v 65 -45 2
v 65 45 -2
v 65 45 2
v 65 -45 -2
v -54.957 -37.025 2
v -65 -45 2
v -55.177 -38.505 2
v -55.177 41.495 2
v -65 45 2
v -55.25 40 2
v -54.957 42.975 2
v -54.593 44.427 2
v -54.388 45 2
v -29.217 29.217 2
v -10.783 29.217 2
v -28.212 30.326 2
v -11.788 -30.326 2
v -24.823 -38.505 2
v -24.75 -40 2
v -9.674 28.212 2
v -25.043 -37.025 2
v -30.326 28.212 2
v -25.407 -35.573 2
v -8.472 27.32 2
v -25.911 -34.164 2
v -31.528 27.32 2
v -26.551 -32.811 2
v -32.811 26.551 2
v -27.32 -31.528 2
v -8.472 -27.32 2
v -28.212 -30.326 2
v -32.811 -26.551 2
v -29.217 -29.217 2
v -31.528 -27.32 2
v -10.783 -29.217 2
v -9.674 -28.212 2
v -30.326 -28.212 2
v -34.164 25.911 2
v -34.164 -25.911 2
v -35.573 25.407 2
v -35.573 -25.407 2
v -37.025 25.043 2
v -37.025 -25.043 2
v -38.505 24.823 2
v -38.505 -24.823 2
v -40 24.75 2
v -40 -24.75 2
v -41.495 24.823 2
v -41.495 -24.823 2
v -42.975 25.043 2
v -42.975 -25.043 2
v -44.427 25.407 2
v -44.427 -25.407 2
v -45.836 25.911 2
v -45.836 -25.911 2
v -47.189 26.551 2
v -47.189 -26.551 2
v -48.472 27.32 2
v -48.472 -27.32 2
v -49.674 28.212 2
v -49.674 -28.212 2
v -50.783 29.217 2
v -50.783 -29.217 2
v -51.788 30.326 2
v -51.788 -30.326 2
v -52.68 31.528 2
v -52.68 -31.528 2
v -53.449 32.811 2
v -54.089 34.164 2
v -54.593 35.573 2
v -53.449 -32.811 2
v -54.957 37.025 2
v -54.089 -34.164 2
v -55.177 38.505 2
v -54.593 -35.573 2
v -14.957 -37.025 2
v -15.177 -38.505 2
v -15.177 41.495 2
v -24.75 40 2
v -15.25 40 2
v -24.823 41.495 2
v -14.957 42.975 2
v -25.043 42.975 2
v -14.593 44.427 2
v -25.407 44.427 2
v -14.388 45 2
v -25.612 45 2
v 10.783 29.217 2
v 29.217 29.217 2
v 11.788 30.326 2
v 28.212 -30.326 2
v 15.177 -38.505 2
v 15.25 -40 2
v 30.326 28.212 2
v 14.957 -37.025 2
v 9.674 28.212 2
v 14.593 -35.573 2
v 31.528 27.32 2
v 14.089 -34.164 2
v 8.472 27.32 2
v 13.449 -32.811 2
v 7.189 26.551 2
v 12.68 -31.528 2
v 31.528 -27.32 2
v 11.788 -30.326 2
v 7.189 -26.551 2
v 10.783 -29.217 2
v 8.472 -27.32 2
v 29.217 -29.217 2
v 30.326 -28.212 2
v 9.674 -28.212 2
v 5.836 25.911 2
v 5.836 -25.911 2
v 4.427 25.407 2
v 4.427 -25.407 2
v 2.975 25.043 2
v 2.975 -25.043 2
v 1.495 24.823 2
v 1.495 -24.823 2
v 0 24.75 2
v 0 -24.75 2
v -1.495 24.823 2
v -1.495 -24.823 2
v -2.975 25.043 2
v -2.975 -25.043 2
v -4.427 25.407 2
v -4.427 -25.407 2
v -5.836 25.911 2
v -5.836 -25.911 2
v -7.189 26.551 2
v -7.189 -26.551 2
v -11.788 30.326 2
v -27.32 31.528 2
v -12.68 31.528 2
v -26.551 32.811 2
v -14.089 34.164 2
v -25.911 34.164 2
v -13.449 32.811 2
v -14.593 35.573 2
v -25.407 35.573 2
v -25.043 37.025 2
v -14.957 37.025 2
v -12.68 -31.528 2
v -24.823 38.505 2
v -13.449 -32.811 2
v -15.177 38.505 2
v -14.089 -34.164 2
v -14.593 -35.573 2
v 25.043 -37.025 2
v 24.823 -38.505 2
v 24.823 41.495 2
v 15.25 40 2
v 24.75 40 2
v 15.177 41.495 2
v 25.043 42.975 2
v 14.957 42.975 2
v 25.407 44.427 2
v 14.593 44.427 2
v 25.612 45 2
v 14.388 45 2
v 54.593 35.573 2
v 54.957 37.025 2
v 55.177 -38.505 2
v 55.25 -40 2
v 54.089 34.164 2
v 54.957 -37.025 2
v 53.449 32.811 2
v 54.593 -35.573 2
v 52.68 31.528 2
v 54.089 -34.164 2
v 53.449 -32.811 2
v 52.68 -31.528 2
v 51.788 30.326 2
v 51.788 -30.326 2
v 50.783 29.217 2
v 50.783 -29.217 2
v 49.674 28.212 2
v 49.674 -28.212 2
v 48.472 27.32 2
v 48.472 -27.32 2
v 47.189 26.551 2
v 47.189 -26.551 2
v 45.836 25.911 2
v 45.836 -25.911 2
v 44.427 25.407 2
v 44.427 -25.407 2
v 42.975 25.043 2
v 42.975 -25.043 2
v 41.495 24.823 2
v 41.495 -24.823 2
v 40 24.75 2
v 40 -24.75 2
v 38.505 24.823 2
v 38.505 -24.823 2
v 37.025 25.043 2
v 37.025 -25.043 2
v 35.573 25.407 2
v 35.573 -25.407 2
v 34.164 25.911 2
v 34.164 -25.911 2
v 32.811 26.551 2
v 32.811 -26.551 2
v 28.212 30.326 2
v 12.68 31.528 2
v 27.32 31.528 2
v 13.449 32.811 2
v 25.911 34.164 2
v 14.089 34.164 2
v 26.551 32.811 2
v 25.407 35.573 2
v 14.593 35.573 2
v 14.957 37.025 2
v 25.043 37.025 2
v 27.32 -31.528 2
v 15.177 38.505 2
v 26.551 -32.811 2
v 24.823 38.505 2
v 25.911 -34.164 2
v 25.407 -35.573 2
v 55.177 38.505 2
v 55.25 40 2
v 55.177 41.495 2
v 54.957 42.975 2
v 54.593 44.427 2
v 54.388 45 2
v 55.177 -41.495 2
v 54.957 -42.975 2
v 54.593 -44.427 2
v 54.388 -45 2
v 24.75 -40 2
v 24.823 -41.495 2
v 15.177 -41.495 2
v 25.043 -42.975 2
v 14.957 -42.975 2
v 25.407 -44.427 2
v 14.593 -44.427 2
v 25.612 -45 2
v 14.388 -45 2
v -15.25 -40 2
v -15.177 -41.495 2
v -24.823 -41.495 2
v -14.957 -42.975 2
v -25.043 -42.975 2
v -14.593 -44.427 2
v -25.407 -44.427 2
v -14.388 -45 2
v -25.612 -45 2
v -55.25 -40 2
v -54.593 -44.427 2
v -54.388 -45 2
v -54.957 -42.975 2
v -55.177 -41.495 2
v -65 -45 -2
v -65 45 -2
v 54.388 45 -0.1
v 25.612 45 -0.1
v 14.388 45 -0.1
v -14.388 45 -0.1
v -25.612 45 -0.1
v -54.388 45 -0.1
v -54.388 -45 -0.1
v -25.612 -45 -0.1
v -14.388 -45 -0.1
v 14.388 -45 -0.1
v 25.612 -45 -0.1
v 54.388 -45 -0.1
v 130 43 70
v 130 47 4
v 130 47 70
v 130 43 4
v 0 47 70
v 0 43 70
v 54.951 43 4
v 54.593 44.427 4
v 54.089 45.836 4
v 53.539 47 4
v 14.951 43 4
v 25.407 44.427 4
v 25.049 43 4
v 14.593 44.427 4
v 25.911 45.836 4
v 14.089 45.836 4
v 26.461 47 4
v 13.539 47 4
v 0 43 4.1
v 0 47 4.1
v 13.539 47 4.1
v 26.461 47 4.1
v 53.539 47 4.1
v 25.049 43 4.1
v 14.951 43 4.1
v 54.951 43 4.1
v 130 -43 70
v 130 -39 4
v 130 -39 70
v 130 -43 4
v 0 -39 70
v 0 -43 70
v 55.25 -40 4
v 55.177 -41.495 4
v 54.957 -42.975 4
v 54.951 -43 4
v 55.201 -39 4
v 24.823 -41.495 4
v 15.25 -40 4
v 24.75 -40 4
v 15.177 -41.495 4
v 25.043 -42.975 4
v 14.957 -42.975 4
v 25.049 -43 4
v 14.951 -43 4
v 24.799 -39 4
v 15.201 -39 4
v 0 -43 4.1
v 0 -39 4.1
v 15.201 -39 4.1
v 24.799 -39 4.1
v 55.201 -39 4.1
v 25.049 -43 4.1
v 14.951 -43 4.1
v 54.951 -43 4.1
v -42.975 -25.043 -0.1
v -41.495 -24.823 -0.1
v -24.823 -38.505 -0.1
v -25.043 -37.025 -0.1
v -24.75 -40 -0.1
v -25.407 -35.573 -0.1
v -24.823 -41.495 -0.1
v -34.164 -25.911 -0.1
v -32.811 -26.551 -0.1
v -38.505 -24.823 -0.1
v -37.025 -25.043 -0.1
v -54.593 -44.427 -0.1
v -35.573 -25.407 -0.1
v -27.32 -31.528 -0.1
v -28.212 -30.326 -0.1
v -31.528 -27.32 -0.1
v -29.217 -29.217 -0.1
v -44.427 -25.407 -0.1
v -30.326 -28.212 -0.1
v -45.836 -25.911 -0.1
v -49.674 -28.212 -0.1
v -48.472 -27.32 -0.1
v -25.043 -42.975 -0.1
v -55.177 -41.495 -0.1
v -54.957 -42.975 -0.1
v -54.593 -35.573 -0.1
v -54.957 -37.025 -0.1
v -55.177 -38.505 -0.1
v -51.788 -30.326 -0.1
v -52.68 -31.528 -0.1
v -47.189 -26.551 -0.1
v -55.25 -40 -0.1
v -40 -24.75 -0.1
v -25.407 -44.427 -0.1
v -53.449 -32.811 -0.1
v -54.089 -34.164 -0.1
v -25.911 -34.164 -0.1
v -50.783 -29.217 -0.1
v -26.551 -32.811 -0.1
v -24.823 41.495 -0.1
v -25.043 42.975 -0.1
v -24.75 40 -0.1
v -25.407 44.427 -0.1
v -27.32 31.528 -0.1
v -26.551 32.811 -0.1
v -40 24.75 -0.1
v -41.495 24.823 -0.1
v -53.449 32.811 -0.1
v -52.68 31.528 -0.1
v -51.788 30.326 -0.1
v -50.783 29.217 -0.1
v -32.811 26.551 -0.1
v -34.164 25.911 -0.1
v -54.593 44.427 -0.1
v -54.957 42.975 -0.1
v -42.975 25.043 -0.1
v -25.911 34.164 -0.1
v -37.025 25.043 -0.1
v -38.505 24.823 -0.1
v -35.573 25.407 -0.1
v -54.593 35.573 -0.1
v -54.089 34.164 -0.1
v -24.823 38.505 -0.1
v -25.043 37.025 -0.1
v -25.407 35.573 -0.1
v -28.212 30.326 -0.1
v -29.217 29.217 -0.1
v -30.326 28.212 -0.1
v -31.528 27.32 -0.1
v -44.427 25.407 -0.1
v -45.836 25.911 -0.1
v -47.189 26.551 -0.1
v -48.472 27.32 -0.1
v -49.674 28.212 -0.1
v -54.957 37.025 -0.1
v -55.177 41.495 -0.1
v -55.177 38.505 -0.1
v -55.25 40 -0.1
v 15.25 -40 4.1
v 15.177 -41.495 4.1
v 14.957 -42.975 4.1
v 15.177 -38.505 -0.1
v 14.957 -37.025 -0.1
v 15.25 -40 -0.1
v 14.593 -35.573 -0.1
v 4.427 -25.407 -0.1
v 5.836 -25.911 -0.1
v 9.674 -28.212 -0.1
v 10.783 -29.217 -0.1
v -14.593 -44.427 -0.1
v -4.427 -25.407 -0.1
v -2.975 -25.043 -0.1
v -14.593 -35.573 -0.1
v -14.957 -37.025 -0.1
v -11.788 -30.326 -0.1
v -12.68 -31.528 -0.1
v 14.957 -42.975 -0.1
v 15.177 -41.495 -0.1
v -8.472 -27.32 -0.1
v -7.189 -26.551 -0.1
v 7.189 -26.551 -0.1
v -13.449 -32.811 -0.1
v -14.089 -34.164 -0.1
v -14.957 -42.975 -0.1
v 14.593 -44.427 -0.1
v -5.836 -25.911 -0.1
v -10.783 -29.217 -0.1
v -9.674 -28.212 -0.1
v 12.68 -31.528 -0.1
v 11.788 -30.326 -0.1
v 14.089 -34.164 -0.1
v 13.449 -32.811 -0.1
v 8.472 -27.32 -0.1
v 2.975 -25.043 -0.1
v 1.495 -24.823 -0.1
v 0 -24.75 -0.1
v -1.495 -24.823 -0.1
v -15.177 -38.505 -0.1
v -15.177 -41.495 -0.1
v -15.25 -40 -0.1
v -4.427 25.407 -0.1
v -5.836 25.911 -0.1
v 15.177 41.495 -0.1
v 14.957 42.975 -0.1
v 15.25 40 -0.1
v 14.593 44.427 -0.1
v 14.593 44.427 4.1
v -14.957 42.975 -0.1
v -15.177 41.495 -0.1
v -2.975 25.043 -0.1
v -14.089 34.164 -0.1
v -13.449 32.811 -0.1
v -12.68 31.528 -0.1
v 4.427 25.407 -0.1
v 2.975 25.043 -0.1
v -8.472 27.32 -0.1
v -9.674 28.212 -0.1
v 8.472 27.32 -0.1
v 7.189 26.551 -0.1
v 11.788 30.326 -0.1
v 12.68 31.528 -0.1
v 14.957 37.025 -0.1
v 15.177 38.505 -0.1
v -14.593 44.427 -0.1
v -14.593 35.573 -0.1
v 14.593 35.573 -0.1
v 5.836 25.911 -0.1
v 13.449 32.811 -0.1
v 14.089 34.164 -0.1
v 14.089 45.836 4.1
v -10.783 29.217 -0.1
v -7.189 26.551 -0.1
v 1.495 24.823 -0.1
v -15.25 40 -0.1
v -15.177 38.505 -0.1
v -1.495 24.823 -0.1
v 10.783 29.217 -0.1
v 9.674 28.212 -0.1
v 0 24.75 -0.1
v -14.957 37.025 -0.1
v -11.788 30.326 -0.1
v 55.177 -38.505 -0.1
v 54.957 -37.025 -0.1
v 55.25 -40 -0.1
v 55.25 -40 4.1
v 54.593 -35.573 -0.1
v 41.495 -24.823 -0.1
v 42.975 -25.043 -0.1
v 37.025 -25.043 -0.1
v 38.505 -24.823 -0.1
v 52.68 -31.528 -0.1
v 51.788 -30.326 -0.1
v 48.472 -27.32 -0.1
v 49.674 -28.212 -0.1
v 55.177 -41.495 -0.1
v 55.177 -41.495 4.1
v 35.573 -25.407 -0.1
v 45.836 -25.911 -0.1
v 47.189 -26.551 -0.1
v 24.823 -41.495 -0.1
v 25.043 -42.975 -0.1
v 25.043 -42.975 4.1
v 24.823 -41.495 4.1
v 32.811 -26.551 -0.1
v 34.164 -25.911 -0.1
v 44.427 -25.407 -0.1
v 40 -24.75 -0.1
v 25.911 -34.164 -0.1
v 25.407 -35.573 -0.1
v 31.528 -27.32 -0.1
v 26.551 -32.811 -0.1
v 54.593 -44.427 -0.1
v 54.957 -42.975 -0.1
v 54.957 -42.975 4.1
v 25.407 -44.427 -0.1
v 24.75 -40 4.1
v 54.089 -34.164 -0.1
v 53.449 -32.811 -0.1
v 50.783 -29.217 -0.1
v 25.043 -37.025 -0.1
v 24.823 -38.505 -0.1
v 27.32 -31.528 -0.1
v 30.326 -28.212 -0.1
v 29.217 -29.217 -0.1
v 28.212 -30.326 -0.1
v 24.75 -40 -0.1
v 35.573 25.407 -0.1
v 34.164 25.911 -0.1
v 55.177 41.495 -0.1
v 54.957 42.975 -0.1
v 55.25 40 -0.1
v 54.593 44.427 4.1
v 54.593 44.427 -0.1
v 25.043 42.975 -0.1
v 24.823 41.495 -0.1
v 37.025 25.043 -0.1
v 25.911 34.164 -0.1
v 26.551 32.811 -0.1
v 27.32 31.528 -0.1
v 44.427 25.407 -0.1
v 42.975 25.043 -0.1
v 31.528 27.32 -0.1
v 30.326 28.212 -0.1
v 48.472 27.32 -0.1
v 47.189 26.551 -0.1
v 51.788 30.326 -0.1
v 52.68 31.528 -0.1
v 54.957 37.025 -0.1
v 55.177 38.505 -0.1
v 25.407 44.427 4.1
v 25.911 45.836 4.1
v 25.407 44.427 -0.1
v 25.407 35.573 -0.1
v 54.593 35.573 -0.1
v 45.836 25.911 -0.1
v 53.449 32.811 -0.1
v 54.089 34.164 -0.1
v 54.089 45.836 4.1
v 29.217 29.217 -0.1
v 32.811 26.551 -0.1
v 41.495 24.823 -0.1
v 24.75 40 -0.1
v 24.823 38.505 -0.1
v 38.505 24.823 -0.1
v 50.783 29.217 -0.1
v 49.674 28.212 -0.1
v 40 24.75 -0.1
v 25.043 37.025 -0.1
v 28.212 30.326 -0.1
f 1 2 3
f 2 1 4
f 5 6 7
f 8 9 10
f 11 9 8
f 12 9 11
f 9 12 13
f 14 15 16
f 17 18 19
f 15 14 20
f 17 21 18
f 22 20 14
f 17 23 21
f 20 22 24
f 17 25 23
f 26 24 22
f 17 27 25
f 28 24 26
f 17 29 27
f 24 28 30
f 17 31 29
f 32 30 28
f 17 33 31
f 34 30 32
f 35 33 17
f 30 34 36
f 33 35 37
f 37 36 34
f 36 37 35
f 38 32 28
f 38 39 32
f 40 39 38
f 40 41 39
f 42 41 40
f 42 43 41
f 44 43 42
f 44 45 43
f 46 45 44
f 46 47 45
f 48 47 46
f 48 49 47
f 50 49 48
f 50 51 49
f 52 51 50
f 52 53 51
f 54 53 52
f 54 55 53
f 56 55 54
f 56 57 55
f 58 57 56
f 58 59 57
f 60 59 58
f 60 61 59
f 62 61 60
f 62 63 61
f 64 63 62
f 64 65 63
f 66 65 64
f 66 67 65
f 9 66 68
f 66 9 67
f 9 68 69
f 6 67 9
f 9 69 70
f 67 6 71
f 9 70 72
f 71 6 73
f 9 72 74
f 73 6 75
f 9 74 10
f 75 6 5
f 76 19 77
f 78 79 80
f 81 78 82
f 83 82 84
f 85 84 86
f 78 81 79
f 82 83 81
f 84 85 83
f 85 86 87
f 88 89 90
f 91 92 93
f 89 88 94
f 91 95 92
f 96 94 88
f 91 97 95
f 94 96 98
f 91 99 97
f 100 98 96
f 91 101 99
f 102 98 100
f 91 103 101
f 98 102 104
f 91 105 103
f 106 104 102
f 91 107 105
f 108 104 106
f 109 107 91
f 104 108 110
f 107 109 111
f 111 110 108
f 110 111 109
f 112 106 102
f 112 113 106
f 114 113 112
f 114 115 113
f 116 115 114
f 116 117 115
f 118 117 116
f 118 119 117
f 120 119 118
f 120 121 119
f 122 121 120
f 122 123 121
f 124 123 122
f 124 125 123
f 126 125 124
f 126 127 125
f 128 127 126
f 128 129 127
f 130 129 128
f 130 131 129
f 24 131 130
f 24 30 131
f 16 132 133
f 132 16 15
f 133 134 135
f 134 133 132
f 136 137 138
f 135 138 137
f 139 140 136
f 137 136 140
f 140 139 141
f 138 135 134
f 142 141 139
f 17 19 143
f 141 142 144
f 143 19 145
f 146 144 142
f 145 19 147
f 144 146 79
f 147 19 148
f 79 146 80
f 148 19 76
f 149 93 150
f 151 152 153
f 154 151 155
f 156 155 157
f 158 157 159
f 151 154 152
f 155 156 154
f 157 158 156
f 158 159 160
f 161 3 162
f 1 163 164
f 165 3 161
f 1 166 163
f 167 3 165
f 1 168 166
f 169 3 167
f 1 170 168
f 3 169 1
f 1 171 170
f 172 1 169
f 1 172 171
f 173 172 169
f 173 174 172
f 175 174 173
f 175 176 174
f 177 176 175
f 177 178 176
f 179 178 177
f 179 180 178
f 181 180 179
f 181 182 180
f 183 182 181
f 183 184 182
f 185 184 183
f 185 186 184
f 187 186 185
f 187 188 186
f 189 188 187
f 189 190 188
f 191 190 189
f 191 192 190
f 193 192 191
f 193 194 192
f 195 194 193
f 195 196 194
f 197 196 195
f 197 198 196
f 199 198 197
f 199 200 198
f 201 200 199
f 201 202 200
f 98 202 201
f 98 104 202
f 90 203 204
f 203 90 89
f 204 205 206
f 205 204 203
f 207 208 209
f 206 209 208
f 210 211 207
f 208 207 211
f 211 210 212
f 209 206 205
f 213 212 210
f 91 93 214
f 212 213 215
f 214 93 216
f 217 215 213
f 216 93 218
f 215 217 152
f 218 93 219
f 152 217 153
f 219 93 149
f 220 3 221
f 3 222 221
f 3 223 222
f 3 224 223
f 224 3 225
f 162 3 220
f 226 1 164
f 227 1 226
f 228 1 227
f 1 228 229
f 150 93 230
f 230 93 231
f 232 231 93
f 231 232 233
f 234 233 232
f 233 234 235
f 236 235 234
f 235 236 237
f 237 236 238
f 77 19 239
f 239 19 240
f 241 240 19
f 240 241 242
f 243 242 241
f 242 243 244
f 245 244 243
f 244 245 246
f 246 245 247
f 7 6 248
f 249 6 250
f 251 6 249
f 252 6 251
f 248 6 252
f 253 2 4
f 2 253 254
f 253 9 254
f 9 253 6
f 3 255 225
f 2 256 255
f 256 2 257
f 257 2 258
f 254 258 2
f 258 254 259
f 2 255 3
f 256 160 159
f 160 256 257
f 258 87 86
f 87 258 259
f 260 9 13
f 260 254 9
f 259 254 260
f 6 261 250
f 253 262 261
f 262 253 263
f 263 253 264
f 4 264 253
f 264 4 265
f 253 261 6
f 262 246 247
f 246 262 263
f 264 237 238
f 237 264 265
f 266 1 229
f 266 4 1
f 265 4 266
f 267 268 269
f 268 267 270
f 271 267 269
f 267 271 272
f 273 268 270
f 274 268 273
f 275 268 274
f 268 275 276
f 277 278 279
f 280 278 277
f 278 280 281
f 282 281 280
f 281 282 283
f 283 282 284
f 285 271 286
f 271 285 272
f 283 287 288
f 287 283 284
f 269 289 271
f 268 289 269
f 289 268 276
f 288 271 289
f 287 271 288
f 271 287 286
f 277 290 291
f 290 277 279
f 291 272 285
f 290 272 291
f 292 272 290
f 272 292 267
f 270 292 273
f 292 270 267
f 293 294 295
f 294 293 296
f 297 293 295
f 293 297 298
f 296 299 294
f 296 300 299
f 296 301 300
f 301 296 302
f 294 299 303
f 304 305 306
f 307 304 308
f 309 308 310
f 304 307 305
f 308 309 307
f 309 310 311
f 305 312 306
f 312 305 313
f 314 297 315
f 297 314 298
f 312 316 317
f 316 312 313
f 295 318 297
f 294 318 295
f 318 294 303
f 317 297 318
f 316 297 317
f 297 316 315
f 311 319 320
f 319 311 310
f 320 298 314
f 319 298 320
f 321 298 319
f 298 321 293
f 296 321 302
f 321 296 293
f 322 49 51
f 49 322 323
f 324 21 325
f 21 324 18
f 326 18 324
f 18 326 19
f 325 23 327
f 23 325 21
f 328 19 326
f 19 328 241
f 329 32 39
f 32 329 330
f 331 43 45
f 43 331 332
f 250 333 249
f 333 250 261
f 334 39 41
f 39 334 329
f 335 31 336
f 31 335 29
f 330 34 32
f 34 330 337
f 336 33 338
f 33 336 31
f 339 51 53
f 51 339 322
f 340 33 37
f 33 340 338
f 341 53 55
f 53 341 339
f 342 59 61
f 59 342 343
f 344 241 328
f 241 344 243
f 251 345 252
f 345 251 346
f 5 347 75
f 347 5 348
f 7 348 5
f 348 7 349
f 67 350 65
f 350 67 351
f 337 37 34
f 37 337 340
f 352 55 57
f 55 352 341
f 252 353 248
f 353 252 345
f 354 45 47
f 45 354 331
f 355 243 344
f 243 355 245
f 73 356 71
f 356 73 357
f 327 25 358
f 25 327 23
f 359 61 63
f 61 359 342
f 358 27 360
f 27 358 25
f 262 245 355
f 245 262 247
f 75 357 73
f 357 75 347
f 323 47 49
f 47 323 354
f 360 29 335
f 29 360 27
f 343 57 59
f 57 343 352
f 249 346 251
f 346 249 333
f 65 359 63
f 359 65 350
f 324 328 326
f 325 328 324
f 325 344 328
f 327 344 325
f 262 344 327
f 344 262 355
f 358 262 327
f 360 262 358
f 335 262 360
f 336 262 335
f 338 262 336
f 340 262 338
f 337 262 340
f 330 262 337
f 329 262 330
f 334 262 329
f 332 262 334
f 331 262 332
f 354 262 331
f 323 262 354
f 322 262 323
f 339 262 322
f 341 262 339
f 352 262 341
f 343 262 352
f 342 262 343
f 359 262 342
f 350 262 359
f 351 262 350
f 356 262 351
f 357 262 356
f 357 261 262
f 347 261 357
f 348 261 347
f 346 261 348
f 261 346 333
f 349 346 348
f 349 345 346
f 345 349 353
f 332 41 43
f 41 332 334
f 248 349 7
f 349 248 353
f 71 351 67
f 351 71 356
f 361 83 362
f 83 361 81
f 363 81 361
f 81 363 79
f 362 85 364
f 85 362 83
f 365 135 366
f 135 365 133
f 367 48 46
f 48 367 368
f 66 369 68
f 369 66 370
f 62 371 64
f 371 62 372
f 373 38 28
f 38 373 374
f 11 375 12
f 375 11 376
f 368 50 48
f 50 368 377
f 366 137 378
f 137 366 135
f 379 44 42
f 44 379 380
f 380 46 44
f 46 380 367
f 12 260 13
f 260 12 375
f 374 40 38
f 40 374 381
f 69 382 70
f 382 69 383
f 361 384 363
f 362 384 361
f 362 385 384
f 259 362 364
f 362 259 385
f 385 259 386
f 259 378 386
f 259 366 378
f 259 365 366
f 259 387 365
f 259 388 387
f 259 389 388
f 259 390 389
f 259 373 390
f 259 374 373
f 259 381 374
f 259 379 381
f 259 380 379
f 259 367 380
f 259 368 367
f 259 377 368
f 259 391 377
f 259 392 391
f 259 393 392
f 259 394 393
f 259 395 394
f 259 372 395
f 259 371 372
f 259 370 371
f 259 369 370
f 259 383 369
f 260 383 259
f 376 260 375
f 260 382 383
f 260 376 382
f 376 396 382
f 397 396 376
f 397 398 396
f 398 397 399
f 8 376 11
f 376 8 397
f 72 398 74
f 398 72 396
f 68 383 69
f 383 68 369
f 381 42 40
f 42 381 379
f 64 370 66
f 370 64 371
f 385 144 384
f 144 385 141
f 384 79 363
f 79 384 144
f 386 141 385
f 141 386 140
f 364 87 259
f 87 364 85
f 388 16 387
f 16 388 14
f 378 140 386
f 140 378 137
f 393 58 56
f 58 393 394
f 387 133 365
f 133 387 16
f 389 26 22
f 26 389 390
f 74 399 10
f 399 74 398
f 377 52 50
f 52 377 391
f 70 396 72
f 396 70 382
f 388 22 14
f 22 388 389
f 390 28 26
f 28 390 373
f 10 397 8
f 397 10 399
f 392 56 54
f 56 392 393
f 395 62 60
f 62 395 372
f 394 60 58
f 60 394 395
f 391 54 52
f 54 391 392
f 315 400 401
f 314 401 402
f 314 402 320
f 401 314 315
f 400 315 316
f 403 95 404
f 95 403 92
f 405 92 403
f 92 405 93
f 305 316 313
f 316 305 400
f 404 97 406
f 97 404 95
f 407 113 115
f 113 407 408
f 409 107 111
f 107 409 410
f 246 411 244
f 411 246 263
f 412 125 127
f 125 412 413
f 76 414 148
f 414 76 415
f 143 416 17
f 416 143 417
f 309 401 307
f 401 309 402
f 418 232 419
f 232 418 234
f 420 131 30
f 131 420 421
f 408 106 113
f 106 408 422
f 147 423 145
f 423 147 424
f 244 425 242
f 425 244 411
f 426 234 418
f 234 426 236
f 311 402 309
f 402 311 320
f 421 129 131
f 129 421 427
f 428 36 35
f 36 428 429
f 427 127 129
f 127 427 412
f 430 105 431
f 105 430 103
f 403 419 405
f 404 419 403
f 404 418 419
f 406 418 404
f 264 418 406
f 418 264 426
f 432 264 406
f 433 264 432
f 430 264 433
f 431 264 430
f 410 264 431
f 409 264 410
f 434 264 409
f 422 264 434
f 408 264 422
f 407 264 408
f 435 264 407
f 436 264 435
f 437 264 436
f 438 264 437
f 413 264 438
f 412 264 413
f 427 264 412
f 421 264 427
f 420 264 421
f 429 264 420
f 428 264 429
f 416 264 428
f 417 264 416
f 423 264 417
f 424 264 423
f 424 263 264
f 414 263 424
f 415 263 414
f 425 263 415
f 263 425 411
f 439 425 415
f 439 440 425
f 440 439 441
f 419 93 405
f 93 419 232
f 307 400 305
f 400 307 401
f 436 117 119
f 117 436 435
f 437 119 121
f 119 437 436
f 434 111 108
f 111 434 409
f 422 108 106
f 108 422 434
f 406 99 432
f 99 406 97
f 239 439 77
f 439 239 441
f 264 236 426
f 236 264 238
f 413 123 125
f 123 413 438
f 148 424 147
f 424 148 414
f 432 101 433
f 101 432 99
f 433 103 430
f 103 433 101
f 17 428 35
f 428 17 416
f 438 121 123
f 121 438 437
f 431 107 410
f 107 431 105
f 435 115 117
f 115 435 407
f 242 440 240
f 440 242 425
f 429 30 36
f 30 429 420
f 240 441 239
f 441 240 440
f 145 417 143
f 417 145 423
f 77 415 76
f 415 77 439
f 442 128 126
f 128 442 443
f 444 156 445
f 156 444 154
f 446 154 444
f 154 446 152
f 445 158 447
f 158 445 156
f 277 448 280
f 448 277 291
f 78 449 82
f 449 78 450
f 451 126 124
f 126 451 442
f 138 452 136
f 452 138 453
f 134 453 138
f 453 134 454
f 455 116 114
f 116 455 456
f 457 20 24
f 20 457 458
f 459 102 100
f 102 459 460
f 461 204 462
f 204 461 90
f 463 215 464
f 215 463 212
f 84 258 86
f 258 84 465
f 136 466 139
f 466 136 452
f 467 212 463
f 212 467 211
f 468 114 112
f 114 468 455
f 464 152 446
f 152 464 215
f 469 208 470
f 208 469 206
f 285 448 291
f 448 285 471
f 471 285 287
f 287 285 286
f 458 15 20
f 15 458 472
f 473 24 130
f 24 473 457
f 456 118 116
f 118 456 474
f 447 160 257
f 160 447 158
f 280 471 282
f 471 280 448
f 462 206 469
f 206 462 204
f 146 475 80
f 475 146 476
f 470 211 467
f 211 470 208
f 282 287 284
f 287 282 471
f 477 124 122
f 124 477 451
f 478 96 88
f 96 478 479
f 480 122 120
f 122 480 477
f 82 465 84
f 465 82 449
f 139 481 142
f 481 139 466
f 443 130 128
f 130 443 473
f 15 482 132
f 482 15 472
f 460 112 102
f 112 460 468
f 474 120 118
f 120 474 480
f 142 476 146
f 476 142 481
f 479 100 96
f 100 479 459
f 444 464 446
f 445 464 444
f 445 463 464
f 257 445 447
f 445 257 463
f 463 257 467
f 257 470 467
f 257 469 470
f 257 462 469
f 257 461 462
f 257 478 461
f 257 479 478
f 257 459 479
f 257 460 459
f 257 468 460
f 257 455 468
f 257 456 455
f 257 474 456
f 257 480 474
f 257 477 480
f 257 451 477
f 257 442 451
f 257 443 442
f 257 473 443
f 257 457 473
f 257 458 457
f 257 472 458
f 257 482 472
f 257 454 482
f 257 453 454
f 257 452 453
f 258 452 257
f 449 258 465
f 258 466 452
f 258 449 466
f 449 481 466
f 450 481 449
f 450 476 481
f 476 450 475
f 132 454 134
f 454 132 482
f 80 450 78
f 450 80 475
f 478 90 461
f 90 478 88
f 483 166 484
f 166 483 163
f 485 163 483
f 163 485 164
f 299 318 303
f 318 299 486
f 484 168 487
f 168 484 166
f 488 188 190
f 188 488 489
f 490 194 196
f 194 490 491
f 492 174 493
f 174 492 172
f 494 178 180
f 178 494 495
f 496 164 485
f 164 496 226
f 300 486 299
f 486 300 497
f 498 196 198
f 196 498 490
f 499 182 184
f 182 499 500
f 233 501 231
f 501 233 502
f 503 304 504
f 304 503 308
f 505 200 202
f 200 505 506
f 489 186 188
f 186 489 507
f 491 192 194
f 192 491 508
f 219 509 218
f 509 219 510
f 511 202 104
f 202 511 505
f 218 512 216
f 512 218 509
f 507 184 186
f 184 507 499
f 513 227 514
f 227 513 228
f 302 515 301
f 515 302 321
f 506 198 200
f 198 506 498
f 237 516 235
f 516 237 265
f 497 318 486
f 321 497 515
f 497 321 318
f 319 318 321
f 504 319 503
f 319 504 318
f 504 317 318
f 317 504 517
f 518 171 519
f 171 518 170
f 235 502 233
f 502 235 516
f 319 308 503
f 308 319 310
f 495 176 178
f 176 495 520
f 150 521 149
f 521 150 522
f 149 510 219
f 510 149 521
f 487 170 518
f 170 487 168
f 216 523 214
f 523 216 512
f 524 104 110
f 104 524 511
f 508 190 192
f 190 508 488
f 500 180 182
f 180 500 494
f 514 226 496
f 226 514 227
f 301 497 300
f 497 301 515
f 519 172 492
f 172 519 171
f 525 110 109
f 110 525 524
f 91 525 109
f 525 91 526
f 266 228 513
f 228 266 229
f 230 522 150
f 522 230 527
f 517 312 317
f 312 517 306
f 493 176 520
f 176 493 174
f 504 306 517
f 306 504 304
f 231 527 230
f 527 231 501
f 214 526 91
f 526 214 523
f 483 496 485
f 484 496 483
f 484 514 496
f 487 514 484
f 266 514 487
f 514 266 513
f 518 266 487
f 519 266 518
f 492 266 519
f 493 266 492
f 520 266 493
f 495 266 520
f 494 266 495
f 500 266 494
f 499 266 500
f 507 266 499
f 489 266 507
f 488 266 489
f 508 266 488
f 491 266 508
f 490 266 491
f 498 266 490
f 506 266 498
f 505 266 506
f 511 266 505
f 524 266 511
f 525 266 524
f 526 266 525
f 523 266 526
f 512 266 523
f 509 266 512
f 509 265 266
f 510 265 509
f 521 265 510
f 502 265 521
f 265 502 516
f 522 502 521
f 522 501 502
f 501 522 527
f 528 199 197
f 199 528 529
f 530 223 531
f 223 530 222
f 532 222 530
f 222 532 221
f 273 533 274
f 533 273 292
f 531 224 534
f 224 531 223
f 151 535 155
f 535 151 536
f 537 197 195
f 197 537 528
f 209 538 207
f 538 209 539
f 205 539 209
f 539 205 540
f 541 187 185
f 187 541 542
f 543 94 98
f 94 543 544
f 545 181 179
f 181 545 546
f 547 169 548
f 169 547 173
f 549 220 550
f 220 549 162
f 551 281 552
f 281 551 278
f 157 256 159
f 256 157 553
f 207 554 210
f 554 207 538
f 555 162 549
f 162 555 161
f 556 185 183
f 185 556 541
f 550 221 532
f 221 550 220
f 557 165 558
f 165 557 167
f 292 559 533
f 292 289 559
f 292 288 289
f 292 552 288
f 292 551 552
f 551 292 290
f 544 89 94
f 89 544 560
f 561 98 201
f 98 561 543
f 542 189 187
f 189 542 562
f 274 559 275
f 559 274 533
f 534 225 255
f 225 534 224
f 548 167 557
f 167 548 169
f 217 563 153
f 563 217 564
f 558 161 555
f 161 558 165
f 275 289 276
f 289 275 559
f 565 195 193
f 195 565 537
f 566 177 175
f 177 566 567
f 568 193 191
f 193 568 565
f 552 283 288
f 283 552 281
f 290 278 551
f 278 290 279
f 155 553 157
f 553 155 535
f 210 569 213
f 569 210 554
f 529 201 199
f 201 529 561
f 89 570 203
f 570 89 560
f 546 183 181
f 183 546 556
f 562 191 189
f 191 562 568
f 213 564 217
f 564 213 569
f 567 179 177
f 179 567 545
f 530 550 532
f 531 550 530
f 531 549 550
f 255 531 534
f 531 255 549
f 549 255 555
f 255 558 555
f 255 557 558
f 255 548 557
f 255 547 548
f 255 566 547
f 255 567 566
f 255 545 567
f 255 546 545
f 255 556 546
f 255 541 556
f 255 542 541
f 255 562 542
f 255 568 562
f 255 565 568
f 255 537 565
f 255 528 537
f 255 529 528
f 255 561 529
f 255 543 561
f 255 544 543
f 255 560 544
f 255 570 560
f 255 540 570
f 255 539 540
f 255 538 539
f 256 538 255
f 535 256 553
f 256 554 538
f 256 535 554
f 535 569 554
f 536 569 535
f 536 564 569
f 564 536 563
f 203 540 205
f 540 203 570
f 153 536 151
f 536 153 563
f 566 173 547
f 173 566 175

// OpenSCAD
$fn = 64;

// Plate dimensions
plate_x = 130;      // Length along X
plate_y = 90;       // Width along Y
plate_z = 4;        // Thickness

// Hole dimensions
hole_dia = 30.5;    // Diameter of tube holes

// Hole grid spacing
hole_spacing_x = 40; // Centre-to-centre along X
hole_spacing_y = 40; // Centre-to-centre along Y

// Wall dimensions
wall_x = 130;       // Length along X
wall_y = 4;         // Thickness along Y
wall_h = 66;        // Height above plate (rises to z=70)

// Hole centres (3 along X, 2 along Y)
x_centers = [-hole_spacing_x, 0, hole_spacing_x];
y_centers = [-hole_spacing_y, hole_spacing_y];

difference() {
  union() {
    // Base plate (sits on bed z=0)
    cube([plate_x, plate_y, plate_z], center = true);
    
    // Long walls (flush with plate edges, start at z=4)
    translate([0, plate_y/2 - wall_y/2, plate_z])
      cube([wall_x, wall_y, wall_h]);
      
    translate([0, -plate_y/2 + wall_y/2, plate_z])
      cube([wall_x, wall_y, wall_h]);
  }
  
  // Through-holes
  for (x = x_centers) {
    for (y = y_centers) {
      translate([x, y, -0.1])
        cylinder(d = hole_dia, h = plate_z + 0.2, center = false);
    }
  }
}
